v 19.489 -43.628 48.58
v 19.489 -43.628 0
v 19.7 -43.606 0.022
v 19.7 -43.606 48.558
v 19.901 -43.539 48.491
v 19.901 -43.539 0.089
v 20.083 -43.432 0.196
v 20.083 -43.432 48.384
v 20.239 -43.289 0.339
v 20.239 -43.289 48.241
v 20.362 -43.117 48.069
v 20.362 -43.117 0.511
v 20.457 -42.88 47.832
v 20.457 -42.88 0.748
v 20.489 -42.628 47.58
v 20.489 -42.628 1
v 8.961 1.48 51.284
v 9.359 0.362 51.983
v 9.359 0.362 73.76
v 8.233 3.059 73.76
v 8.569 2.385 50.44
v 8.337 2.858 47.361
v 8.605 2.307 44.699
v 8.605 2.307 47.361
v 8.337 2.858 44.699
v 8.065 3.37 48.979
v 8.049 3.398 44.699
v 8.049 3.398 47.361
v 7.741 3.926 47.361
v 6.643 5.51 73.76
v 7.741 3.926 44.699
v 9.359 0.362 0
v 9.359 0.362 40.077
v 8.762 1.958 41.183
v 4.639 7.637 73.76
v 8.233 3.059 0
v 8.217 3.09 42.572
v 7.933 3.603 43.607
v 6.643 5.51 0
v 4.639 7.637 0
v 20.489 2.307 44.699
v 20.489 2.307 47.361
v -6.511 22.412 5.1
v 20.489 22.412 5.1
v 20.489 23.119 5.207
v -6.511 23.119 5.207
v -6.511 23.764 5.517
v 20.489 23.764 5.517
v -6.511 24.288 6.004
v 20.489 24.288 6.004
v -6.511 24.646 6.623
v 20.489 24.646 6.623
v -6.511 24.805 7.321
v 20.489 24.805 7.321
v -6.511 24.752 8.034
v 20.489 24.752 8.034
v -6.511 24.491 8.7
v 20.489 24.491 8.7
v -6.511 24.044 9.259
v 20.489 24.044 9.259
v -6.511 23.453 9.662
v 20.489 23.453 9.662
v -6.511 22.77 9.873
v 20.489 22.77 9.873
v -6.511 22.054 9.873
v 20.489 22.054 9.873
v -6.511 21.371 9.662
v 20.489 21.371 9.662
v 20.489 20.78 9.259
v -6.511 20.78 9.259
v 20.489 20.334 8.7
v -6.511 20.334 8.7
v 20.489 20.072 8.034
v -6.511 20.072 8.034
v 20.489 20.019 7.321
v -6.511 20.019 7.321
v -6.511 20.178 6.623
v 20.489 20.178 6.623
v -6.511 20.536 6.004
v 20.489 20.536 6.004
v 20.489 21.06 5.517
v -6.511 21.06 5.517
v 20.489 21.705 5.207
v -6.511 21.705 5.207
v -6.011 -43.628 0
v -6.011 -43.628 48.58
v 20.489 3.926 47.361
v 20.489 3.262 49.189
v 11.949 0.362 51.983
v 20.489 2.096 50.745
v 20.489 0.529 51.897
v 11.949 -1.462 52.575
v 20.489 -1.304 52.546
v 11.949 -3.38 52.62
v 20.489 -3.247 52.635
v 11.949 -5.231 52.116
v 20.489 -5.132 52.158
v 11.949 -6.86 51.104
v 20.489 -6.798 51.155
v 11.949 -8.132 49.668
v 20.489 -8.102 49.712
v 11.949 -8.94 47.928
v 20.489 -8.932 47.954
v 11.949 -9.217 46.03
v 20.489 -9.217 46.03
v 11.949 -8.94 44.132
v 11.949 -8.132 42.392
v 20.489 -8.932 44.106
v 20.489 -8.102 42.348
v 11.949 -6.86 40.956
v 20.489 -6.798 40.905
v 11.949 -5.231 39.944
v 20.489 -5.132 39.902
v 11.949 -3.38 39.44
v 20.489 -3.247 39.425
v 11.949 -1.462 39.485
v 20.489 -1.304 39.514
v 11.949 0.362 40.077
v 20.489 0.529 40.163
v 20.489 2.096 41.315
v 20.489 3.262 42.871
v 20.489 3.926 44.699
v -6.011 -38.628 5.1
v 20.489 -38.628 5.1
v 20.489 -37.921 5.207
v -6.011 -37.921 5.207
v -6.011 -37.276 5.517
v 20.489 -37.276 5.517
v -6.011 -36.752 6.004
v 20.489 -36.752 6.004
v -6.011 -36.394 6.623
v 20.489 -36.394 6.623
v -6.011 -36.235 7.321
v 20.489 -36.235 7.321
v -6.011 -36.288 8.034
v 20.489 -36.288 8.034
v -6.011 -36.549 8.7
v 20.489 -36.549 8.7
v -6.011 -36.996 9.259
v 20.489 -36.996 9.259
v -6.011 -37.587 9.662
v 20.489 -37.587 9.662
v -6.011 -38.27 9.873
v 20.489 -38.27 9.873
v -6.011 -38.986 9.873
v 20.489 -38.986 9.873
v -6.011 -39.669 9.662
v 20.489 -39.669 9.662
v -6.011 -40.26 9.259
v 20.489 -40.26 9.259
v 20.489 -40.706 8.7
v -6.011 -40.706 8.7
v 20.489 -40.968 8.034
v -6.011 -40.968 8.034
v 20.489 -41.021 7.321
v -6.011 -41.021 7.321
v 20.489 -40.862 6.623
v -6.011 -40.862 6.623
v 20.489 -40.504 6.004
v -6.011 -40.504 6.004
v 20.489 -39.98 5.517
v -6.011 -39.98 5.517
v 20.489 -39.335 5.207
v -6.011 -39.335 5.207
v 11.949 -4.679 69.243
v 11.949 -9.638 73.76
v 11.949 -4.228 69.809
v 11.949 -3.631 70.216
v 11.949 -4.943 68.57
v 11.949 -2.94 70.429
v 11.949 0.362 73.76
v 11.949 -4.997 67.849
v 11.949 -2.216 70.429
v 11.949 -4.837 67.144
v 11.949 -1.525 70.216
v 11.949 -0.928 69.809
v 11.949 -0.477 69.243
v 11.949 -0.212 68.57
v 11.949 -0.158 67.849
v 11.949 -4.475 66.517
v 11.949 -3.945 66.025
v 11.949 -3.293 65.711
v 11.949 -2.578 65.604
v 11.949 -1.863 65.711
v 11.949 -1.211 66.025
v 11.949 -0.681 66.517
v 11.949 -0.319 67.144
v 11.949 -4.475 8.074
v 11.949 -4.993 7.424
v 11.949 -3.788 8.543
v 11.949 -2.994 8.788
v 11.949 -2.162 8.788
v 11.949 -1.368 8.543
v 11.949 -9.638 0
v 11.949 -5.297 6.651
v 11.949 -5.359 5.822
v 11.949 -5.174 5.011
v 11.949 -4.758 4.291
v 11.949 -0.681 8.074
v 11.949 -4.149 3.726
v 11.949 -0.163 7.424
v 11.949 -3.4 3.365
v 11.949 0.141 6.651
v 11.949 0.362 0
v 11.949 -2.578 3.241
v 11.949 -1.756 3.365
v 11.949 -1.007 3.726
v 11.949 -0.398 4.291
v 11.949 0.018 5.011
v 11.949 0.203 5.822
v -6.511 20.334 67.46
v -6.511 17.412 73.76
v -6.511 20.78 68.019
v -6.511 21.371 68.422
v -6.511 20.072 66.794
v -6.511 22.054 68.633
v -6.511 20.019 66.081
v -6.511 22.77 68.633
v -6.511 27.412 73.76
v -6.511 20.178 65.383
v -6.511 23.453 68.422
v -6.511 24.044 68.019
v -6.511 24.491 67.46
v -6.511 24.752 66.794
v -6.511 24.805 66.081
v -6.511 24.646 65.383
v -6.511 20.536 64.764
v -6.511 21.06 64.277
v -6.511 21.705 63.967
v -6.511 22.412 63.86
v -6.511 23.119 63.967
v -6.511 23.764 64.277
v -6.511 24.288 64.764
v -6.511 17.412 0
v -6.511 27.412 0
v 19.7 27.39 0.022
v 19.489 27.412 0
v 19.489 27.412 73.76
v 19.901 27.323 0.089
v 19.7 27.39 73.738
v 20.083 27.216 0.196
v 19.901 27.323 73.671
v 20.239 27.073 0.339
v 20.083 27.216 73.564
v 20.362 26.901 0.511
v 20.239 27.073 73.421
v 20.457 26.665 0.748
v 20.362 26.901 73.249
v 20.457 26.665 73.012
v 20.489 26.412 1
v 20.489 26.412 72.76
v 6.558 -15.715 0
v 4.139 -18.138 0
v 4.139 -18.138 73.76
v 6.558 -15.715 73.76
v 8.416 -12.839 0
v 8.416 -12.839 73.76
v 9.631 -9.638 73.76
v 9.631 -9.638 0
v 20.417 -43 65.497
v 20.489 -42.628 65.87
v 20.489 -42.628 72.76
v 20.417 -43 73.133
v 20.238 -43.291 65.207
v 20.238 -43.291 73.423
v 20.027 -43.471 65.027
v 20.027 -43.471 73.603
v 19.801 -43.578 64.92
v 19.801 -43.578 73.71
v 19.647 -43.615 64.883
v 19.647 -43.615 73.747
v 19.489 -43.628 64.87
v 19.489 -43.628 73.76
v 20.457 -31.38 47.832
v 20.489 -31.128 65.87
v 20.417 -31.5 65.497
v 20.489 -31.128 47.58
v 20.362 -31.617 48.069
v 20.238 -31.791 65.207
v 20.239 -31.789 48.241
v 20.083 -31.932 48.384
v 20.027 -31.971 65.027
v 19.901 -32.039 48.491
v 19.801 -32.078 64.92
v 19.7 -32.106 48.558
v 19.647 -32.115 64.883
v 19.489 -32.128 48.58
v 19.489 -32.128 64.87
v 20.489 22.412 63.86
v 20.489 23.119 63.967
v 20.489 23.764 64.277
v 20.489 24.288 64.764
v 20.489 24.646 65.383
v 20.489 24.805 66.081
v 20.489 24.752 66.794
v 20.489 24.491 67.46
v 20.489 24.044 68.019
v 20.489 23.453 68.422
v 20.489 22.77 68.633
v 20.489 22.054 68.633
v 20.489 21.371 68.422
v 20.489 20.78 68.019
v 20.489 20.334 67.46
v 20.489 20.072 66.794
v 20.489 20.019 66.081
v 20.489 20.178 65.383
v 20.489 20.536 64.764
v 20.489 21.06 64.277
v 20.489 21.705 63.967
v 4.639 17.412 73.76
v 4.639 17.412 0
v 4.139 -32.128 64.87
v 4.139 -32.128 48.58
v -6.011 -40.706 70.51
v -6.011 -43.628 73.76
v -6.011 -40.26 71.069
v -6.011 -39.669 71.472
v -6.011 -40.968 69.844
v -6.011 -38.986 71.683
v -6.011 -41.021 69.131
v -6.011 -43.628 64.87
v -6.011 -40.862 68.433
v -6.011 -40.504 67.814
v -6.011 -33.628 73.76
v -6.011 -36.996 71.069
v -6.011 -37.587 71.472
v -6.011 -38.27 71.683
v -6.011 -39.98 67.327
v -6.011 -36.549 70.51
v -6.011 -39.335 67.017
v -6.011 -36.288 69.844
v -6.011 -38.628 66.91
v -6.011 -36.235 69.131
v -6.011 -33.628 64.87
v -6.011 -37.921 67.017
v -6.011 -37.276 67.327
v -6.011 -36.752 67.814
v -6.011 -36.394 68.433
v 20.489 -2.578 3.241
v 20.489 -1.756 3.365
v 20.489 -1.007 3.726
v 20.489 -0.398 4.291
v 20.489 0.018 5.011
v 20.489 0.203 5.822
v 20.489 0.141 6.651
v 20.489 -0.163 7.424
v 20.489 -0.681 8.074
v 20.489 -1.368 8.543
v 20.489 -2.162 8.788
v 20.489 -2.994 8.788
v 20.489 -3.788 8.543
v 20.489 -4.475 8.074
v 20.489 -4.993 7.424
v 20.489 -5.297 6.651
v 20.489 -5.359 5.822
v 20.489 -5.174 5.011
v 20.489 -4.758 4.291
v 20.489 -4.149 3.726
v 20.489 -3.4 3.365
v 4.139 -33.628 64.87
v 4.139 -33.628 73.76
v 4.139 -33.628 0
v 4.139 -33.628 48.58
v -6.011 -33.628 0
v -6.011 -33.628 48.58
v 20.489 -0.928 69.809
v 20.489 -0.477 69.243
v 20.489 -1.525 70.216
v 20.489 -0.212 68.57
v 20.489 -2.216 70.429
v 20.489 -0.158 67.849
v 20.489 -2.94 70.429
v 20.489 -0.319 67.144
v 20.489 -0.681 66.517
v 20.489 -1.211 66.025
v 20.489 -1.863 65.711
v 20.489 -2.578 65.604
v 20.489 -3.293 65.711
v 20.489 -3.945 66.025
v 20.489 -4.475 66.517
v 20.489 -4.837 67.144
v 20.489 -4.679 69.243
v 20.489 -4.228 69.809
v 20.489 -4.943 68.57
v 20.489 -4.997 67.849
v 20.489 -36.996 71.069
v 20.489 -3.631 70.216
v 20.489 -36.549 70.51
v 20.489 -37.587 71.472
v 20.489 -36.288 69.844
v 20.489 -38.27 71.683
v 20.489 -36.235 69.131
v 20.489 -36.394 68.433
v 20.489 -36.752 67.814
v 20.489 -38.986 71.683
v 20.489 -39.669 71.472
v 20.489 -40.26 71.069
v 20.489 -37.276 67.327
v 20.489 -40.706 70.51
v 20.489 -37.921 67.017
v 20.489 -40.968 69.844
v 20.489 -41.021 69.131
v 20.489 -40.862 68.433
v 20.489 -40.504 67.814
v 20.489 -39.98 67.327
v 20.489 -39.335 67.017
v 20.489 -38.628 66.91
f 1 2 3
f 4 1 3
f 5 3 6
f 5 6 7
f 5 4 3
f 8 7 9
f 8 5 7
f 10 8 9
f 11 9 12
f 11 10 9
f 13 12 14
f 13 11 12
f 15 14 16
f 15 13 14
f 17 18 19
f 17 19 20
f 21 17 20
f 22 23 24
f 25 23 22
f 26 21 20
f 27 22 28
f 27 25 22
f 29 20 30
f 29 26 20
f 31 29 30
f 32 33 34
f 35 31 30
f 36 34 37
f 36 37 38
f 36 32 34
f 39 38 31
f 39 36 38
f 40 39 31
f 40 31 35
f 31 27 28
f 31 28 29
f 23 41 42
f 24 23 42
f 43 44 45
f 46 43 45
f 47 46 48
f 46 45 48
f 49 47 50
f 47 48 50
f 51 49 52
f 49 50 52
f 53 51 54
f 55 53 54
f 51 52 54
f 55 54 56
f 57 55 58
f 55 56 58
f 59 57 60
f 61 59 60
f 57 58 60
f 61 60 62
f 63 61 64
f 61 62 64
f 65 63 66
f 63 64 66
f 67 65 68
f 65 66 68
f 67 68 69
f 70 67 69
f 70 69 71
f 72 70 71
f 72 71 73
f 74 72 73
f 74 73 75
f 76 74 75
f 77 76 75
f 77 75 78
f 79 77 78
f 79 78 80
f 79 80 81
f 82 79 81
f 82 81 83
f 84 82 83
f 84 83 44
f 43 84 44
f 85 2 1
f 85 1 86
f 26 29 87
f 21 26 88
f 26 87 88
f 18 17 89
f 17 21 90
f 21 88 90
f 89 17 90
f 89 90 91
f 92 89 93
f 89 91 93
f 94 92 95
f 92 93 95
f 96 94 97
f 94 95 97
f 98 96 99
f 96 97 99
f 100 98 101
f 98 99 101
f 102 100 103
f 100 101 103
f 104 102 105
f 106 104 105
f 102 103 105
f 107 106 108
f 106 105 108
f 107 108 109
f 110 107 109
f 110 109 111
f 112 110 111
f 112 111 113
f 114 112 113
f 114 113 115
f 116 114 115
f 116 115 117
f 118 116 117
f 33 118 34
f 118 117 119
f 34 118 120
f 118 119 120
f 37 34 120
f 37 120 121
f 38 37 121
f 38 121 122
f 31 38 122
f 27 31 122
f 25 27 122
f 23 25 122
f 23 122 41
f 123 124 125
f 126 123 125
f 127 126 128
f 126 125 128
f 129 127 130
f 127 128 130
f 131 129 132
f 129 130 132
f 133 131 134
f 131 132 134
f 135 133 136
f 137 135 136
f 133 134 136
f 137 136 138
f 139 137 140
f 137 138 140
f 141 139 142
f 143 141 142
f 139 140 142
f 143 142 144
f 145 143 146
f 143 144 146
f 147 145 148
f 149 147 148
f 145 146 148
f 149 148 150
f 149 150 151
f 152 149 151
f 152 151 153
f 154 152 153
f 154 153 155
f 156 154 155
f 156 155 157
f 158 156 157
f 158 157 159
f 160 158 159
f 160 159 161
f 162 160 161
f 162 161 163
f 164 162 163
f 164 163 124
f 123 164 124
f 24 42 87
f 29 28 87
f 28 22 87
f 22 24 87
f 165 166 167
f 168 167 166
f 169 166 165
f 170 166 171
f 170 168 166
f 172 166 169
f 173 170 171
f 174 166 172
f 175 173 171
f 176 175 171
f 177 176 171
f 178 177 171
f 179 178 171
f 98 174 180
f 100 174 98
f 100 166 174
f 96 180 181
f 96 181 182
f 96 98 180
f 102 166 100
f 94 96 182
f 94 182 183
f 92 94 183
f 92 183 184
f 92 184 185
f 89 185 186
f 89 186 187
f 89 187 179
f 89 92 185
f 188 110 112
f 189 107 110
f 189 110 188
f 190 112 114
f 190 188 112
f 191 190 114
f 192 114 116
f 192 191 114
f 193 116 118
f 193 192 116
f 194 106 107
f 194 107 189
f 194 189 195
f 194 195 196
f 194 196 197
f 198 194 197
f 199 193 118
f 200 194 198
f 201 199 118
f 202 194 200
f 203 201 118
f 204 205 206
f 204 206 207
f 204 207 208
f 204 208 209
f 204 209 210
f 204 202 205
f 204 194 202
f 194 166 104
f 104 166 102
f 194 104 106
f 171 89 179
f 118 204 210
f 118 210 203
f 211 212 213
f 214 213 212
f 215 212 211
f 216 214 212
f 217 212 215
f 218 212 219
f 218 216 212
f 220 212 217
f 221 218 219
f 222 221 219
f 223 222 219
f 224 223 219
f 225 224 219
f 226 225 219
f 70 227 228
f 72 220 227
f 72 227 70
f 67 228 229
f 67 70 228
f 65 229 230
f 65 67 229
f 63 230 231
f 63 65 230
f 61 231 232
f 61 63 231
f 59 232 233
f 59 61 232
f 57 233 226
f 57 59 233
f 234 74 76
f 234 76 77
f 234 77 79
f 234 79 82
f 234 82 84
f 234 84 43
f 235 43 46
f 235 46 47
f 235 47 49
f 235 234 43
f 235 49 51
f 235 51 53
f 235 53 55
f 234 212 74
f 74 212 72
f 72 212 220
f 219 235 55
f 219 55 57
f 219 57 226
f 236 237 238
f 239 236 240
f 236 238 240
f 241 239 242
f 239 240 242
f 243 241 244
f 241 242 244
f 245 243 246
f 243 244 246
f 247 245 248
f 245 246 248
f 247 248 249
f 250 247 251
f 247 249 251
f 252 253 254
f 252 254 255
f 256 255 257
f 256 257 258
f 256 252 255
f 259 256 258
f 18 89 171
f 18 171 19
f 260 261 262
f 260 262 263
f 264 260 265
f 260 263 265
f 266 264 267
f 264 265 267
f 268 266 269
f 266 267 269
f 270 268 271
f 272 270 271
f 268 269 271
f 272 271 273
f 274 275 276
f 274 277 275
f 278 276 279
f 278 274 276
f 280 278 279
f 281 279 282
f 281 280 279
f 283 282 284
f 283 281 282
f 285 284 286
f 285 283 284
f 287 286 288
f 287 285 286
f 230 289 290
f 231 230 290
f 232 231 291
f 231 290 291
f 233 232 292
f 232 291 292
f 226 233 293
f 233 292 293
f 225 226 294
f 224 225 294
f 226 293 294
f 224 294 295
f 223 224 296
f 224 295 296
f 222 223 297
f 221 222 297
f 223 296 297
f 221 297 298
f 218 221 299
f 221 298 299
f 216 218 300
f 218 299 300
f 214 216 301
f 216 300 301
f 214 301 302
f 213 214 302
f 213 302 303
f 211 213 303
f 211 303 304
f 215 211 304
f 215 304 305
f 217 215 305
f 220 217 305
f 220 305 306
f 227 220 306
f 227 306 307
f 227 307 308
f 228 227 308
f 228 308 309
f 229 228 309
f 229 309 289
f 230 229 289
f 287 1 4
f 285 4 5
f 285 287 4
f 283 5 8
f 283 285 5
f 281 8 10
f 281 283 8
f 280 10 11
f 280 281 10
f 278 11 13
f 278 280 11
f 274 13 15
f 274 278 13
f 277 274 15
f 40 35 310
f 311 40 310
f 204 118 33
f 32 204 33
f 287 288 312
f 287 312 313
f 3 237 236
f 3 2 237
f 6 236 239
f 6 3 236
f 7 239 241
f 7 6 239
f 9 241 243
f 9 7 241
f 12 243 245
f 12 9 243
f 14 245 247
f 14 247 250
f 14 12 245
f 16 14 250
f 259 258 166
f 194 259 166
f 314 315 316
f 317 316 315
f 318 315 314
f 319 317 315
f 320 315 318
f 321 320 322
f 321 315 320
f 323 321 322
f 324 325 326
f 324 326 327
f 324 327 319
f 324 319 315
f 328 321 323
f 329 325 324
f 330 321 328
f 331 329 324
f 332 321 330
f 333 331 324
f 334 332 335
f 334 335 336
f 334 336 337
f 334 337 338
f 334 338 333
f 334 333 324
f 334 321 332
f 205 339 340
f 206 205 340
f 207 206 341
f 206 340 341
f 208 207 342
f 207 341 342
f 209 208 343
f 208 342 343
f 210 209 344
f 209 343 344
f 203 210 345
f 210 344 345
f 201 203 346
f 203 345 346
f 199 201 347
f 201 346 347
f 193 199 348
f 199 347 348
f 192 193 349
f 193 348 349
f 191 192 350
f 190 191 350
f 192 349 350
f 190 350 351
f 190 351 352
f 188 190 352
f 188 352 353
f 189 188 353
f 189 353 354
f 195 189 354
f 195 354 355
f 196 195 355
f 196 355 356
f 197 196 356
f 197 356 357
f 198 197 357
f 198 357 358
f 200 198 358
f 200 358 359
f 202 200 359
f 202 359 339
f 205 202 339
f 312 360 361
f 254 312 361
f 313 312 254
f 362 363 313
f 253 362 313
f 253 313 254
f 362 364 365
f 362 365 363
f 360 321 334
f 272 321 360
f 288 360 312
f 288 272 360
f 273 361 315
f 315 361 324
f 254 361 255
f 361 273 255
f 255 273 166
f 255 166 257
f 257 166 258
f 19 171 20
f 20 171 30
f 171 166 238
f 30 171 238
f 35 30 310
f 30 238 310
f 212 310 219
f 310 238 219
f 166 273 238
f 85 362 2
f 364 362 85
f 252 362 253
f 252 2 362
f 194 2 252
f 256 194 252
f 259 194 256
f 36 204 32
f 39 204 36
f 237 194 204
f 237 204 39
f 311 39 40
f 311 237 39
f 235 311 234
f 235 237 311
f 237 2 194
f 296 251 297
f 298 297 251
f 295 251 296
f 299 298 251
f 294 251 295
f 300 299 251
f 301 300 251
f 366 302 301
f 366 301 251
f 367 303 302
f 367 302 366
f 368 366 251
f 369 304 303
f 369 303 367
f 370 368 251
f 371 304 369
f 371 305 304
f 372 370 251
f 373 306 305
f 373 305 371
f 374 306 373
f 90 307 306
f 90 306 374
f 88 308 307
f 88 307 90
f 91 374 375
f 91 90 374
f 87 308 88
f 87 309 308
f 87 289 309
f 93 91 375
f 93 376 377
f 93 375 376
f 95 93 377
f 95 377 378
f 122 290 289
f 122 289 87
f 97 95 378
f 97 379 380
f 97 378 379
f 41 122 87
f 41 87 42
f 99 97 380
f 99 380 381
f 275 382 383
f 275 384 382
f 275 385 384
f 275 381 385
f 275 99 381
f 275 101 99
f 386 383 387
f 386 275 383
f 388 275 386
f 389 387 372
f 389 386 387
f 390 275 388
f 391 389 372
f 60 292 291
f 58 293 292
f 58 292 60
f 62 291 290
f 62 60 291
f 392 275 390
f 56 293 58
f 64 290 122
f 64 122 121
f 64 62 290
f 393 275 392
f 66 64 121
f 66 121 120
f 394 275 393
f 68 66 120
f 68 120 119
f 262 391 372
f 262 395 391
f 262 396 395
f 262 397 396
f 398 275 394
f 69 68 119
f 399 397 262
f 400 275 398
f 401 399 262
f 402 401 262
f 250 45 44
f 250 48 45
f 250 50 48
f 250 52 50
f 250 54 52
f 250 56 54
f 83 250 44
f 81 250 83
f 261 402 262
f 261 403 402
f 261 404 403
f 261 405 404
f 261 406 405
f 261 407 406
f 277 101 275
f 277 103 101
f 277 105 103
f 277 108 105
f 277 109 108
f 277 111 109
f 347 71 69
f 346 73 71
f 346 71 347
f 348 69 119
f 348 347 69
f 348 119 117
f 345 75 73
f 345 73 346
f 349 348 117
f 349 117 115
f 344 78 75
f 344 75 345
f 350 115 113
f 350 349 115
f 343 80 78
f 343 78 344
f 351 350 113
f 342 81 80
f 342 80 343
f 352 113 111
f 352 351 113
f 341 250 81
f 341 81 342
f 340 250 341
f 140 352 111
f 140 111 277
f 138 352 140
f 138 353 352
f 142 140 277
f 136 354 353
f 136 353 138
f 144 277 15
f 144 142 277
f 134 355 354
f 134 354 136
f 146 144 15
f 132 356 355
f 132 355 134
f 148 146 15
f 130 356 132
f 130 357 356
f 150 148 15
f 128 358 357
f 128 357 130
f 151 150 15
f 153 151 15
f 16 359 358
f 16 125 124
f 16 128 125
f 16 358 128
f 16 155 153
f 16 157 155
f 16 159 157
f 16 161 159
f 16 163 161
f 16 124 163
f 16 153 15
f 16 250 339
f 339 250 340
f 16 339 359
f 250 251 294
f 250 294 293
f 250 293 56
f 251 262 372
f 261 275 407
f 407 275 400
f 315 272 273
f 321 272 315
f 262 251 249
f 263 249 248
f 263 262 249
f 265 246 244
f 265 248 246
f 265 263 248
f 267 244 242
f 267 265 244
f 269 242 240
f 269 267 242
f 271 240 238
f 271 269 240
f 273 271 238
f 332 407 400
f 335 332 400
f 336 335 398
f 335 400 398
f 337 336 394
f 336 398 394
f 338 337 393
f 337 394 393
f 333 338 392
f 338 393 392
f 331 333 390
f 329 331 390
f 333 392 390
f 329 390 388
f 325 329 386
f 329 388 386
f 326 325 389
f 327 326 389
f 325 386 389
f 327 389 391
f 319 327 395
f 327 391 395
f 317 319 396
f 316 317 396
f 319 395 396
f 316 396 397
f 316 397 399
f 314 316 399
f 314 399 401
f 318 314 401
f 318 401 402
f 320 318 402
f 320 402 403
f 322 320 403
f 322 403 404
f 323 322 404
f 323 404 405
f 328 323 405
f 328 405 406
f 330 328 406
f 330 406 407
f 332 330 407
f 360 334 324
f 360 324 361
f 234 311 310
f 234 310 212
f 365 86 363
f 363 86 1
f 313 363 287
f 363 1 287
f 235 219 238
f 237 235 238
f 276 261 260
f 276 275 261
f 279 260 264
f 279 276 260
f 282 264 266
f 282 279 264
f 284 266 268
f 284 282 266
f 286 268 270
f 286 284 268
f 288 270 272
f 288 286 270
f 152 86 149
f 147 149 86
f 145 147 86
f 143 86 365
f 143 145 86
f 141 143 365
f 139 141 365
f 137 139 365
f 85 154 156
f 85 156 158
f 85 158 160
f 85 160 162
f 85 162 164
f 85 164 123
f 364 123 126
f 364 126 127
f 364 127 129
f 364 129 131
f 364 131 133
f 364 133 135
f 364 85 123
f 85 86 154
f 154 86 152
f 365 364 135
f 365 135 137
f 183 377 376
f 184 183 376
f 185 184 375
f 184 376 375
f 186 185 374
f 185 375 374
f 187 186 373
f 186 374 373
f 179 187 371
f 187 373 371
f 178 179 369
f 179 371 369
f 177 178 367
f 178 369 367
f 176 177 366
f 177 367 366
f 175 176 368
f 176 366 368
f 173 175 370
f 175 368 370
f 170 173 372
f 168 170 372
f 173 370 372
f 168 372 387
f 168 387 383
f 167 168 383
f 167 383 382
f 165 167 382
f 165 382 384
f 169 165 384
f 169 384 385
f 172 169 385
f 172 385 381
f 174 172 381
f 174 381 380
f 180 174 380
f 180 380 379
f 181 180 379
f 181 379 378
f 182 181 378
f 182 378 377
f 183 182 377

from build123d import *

# Parameters (mm, degrees)
PROFILEEXTRUDE_DEPTH = 73.76
HOSEWINDOW_W         = 16.29
HOSEWINDOW_H         = 11.5
HOSEWINDOWCUT_DEPTH  = 28
CAGESCREWS_R         = 2.4
CAGESCREWSCUT_DEPTH  = 28
AXLEHOLECUT_DEPTH    = 28
SETSCREWS_R          = 2.426338021
SETSCREWS_R_2        = 2.788762315
SETSCREWSCUT_DEPTH   = 28
FILLET1_R            = 1


with BuildPart() as part:
    # Profile → ProfileExtrude (new body)
    with BuildSketch(Plane.XY):
        with BuildLine():
            Line((-6.01073477, -43.62791746), (-6.01073477, -33.62791746))
            Line((-6.01073477, -33.62791746), (4.13926523, -33.62791746))
            Line((4.13926523, -33.62791746), (4.13926523, -18.13791746))
            ThreePointArc((4.13926523, -18.13791746), (7.563334043, -14.326029686), (9.63126523, -9.63791746))
            Line((9.63126523, -9.63791746), (11.94926523, -9.63791746))
            Line((11.94926523, -9.63791746), (11.94926523, 0.36208254))
            Line((11.94926523, 0.36208254), (9.35926523, 0.36208254))
            ThreePointArc((9.35926523, 0.36208254), (7.493178347, 4.320032013), (4.63926523, 7.63708254))
            Line((4.63926523, 7.63708254), (4.63926523, 17.41208254))
            Line((4.63926523, 17.41208254), (-6.51073477, 17.41208254))
            Line((-6.51073477, 17.41208254), (-6.51073477, 27.41208254))
            Line((-6.51073477, 27.41208254), (20.48926523, 27.41208254))
            Line((20.48926523, 27.41208254), (20.48926523, -43.62791746))
            Line((20.48926523, -43.62791746), (-6.01073477, -43.62791746))
        make_face()
    extrude(amount=PROFILEEXTRUDE_DEPTH)

    # HoseWindow → HoseWindowCut (cut, through all)
    with BuildSketch(Plane(origin=(20.48926523, 0, 0), x_dir=(0, 0, -1), z_dir=(1, 0, 0))):
        with Locations((-56.725, -37.87791746)):
            Rectangle(HOSEWINDOW_W, HOSEWINDOW_H)
    extrude(amount=-HOSEWINDOWCUT_DEPTH, mode=Mode.SUBTRACT)

    # CageScrews → CageScrewsCut (cut, through all)
    with BuildSketch(Plane(origin=(20.48926523, 0, 0), x_dir=(0, 0, -1), z_dir=(1, 0, 0))):
        with Locations((-66.26, 22.41208254)):
            Circle(CAGESCREWS_R)
        with Locations((-7.5, 22.41208254)):
            Circle(CAGESCREWS_R)
        with Locations((-7.5, -38.62791746)):
            Circle(CAGESCREWS_R)
        with Locations((-69.31, -38.62791746)):
            Circle(CAGESCREWS_R)
    extrude(amount=-CAGESCREWSCUT_DEPTH, mode=Mode.SUBTRACT)

    # AxleHole → AxleHoleCut (cut, through all)
    with BuildSketch(Plane(origin=(20.48926523, 0, 0), x_dir=(0, 0, -1), z_dir=(1, 0, 0))):
        with BuildLine():
            Line((-44.699, 2.307293484), (-47.361, 2.307293484))
            Line((-47.361, 2.307293484), (-47.361, 3.926293484))
            ThreePointArc((-47.361, 3.926293484), (-46.03, -9.21691746), (-44.699, 3.926293484))
            Line((-44.699, 3.926293484), (-44.699, 2.307293484))
        make_face()
    extrude(amount=-AXLEHOLECUT_DEPTH, mode=Mode.SUBTRACT)

    # SetScrews → SetScrewsCut (cut, through all)
    with BuildSketch(Plane(origin=(20.48926523, 0, 0), x_dir=(0, 0, -1), z_dir=(1, 0, 0))):
        with Locations((-68.03, -2.57791746)):
            Circle(SETSCREWS_R)
        with Locations((-6.03, -2.57791746)):
            Circle(SETSCREWS_R_2)
    extrude(amount=-SETSCREWSCUT_DEPTH, mode=Mode.SUBTRACT)

    # Fillet1
    fillet1_edges = [part.edges().sort_by_distance(p)[0] for p in [
        (20.48926523, -8.10791746, 0),
        (20.48926523, -43.62791746, 69.315),
        (20.48926523, 27.41208254, 36.88),
        (20.48926523, -8.10791746, 73.76),
        (20.48926523, -43.62791746, 24.29),
        (20.48926523, -37.87791746, 64.87),
        (20.48926523, -37.87791746, 48.58),
        (20.48926523, -32.12791746, 56.725),
    ]]
    fillet(fillet1_edges, radius=FILLET1_R)


solid = part.part
